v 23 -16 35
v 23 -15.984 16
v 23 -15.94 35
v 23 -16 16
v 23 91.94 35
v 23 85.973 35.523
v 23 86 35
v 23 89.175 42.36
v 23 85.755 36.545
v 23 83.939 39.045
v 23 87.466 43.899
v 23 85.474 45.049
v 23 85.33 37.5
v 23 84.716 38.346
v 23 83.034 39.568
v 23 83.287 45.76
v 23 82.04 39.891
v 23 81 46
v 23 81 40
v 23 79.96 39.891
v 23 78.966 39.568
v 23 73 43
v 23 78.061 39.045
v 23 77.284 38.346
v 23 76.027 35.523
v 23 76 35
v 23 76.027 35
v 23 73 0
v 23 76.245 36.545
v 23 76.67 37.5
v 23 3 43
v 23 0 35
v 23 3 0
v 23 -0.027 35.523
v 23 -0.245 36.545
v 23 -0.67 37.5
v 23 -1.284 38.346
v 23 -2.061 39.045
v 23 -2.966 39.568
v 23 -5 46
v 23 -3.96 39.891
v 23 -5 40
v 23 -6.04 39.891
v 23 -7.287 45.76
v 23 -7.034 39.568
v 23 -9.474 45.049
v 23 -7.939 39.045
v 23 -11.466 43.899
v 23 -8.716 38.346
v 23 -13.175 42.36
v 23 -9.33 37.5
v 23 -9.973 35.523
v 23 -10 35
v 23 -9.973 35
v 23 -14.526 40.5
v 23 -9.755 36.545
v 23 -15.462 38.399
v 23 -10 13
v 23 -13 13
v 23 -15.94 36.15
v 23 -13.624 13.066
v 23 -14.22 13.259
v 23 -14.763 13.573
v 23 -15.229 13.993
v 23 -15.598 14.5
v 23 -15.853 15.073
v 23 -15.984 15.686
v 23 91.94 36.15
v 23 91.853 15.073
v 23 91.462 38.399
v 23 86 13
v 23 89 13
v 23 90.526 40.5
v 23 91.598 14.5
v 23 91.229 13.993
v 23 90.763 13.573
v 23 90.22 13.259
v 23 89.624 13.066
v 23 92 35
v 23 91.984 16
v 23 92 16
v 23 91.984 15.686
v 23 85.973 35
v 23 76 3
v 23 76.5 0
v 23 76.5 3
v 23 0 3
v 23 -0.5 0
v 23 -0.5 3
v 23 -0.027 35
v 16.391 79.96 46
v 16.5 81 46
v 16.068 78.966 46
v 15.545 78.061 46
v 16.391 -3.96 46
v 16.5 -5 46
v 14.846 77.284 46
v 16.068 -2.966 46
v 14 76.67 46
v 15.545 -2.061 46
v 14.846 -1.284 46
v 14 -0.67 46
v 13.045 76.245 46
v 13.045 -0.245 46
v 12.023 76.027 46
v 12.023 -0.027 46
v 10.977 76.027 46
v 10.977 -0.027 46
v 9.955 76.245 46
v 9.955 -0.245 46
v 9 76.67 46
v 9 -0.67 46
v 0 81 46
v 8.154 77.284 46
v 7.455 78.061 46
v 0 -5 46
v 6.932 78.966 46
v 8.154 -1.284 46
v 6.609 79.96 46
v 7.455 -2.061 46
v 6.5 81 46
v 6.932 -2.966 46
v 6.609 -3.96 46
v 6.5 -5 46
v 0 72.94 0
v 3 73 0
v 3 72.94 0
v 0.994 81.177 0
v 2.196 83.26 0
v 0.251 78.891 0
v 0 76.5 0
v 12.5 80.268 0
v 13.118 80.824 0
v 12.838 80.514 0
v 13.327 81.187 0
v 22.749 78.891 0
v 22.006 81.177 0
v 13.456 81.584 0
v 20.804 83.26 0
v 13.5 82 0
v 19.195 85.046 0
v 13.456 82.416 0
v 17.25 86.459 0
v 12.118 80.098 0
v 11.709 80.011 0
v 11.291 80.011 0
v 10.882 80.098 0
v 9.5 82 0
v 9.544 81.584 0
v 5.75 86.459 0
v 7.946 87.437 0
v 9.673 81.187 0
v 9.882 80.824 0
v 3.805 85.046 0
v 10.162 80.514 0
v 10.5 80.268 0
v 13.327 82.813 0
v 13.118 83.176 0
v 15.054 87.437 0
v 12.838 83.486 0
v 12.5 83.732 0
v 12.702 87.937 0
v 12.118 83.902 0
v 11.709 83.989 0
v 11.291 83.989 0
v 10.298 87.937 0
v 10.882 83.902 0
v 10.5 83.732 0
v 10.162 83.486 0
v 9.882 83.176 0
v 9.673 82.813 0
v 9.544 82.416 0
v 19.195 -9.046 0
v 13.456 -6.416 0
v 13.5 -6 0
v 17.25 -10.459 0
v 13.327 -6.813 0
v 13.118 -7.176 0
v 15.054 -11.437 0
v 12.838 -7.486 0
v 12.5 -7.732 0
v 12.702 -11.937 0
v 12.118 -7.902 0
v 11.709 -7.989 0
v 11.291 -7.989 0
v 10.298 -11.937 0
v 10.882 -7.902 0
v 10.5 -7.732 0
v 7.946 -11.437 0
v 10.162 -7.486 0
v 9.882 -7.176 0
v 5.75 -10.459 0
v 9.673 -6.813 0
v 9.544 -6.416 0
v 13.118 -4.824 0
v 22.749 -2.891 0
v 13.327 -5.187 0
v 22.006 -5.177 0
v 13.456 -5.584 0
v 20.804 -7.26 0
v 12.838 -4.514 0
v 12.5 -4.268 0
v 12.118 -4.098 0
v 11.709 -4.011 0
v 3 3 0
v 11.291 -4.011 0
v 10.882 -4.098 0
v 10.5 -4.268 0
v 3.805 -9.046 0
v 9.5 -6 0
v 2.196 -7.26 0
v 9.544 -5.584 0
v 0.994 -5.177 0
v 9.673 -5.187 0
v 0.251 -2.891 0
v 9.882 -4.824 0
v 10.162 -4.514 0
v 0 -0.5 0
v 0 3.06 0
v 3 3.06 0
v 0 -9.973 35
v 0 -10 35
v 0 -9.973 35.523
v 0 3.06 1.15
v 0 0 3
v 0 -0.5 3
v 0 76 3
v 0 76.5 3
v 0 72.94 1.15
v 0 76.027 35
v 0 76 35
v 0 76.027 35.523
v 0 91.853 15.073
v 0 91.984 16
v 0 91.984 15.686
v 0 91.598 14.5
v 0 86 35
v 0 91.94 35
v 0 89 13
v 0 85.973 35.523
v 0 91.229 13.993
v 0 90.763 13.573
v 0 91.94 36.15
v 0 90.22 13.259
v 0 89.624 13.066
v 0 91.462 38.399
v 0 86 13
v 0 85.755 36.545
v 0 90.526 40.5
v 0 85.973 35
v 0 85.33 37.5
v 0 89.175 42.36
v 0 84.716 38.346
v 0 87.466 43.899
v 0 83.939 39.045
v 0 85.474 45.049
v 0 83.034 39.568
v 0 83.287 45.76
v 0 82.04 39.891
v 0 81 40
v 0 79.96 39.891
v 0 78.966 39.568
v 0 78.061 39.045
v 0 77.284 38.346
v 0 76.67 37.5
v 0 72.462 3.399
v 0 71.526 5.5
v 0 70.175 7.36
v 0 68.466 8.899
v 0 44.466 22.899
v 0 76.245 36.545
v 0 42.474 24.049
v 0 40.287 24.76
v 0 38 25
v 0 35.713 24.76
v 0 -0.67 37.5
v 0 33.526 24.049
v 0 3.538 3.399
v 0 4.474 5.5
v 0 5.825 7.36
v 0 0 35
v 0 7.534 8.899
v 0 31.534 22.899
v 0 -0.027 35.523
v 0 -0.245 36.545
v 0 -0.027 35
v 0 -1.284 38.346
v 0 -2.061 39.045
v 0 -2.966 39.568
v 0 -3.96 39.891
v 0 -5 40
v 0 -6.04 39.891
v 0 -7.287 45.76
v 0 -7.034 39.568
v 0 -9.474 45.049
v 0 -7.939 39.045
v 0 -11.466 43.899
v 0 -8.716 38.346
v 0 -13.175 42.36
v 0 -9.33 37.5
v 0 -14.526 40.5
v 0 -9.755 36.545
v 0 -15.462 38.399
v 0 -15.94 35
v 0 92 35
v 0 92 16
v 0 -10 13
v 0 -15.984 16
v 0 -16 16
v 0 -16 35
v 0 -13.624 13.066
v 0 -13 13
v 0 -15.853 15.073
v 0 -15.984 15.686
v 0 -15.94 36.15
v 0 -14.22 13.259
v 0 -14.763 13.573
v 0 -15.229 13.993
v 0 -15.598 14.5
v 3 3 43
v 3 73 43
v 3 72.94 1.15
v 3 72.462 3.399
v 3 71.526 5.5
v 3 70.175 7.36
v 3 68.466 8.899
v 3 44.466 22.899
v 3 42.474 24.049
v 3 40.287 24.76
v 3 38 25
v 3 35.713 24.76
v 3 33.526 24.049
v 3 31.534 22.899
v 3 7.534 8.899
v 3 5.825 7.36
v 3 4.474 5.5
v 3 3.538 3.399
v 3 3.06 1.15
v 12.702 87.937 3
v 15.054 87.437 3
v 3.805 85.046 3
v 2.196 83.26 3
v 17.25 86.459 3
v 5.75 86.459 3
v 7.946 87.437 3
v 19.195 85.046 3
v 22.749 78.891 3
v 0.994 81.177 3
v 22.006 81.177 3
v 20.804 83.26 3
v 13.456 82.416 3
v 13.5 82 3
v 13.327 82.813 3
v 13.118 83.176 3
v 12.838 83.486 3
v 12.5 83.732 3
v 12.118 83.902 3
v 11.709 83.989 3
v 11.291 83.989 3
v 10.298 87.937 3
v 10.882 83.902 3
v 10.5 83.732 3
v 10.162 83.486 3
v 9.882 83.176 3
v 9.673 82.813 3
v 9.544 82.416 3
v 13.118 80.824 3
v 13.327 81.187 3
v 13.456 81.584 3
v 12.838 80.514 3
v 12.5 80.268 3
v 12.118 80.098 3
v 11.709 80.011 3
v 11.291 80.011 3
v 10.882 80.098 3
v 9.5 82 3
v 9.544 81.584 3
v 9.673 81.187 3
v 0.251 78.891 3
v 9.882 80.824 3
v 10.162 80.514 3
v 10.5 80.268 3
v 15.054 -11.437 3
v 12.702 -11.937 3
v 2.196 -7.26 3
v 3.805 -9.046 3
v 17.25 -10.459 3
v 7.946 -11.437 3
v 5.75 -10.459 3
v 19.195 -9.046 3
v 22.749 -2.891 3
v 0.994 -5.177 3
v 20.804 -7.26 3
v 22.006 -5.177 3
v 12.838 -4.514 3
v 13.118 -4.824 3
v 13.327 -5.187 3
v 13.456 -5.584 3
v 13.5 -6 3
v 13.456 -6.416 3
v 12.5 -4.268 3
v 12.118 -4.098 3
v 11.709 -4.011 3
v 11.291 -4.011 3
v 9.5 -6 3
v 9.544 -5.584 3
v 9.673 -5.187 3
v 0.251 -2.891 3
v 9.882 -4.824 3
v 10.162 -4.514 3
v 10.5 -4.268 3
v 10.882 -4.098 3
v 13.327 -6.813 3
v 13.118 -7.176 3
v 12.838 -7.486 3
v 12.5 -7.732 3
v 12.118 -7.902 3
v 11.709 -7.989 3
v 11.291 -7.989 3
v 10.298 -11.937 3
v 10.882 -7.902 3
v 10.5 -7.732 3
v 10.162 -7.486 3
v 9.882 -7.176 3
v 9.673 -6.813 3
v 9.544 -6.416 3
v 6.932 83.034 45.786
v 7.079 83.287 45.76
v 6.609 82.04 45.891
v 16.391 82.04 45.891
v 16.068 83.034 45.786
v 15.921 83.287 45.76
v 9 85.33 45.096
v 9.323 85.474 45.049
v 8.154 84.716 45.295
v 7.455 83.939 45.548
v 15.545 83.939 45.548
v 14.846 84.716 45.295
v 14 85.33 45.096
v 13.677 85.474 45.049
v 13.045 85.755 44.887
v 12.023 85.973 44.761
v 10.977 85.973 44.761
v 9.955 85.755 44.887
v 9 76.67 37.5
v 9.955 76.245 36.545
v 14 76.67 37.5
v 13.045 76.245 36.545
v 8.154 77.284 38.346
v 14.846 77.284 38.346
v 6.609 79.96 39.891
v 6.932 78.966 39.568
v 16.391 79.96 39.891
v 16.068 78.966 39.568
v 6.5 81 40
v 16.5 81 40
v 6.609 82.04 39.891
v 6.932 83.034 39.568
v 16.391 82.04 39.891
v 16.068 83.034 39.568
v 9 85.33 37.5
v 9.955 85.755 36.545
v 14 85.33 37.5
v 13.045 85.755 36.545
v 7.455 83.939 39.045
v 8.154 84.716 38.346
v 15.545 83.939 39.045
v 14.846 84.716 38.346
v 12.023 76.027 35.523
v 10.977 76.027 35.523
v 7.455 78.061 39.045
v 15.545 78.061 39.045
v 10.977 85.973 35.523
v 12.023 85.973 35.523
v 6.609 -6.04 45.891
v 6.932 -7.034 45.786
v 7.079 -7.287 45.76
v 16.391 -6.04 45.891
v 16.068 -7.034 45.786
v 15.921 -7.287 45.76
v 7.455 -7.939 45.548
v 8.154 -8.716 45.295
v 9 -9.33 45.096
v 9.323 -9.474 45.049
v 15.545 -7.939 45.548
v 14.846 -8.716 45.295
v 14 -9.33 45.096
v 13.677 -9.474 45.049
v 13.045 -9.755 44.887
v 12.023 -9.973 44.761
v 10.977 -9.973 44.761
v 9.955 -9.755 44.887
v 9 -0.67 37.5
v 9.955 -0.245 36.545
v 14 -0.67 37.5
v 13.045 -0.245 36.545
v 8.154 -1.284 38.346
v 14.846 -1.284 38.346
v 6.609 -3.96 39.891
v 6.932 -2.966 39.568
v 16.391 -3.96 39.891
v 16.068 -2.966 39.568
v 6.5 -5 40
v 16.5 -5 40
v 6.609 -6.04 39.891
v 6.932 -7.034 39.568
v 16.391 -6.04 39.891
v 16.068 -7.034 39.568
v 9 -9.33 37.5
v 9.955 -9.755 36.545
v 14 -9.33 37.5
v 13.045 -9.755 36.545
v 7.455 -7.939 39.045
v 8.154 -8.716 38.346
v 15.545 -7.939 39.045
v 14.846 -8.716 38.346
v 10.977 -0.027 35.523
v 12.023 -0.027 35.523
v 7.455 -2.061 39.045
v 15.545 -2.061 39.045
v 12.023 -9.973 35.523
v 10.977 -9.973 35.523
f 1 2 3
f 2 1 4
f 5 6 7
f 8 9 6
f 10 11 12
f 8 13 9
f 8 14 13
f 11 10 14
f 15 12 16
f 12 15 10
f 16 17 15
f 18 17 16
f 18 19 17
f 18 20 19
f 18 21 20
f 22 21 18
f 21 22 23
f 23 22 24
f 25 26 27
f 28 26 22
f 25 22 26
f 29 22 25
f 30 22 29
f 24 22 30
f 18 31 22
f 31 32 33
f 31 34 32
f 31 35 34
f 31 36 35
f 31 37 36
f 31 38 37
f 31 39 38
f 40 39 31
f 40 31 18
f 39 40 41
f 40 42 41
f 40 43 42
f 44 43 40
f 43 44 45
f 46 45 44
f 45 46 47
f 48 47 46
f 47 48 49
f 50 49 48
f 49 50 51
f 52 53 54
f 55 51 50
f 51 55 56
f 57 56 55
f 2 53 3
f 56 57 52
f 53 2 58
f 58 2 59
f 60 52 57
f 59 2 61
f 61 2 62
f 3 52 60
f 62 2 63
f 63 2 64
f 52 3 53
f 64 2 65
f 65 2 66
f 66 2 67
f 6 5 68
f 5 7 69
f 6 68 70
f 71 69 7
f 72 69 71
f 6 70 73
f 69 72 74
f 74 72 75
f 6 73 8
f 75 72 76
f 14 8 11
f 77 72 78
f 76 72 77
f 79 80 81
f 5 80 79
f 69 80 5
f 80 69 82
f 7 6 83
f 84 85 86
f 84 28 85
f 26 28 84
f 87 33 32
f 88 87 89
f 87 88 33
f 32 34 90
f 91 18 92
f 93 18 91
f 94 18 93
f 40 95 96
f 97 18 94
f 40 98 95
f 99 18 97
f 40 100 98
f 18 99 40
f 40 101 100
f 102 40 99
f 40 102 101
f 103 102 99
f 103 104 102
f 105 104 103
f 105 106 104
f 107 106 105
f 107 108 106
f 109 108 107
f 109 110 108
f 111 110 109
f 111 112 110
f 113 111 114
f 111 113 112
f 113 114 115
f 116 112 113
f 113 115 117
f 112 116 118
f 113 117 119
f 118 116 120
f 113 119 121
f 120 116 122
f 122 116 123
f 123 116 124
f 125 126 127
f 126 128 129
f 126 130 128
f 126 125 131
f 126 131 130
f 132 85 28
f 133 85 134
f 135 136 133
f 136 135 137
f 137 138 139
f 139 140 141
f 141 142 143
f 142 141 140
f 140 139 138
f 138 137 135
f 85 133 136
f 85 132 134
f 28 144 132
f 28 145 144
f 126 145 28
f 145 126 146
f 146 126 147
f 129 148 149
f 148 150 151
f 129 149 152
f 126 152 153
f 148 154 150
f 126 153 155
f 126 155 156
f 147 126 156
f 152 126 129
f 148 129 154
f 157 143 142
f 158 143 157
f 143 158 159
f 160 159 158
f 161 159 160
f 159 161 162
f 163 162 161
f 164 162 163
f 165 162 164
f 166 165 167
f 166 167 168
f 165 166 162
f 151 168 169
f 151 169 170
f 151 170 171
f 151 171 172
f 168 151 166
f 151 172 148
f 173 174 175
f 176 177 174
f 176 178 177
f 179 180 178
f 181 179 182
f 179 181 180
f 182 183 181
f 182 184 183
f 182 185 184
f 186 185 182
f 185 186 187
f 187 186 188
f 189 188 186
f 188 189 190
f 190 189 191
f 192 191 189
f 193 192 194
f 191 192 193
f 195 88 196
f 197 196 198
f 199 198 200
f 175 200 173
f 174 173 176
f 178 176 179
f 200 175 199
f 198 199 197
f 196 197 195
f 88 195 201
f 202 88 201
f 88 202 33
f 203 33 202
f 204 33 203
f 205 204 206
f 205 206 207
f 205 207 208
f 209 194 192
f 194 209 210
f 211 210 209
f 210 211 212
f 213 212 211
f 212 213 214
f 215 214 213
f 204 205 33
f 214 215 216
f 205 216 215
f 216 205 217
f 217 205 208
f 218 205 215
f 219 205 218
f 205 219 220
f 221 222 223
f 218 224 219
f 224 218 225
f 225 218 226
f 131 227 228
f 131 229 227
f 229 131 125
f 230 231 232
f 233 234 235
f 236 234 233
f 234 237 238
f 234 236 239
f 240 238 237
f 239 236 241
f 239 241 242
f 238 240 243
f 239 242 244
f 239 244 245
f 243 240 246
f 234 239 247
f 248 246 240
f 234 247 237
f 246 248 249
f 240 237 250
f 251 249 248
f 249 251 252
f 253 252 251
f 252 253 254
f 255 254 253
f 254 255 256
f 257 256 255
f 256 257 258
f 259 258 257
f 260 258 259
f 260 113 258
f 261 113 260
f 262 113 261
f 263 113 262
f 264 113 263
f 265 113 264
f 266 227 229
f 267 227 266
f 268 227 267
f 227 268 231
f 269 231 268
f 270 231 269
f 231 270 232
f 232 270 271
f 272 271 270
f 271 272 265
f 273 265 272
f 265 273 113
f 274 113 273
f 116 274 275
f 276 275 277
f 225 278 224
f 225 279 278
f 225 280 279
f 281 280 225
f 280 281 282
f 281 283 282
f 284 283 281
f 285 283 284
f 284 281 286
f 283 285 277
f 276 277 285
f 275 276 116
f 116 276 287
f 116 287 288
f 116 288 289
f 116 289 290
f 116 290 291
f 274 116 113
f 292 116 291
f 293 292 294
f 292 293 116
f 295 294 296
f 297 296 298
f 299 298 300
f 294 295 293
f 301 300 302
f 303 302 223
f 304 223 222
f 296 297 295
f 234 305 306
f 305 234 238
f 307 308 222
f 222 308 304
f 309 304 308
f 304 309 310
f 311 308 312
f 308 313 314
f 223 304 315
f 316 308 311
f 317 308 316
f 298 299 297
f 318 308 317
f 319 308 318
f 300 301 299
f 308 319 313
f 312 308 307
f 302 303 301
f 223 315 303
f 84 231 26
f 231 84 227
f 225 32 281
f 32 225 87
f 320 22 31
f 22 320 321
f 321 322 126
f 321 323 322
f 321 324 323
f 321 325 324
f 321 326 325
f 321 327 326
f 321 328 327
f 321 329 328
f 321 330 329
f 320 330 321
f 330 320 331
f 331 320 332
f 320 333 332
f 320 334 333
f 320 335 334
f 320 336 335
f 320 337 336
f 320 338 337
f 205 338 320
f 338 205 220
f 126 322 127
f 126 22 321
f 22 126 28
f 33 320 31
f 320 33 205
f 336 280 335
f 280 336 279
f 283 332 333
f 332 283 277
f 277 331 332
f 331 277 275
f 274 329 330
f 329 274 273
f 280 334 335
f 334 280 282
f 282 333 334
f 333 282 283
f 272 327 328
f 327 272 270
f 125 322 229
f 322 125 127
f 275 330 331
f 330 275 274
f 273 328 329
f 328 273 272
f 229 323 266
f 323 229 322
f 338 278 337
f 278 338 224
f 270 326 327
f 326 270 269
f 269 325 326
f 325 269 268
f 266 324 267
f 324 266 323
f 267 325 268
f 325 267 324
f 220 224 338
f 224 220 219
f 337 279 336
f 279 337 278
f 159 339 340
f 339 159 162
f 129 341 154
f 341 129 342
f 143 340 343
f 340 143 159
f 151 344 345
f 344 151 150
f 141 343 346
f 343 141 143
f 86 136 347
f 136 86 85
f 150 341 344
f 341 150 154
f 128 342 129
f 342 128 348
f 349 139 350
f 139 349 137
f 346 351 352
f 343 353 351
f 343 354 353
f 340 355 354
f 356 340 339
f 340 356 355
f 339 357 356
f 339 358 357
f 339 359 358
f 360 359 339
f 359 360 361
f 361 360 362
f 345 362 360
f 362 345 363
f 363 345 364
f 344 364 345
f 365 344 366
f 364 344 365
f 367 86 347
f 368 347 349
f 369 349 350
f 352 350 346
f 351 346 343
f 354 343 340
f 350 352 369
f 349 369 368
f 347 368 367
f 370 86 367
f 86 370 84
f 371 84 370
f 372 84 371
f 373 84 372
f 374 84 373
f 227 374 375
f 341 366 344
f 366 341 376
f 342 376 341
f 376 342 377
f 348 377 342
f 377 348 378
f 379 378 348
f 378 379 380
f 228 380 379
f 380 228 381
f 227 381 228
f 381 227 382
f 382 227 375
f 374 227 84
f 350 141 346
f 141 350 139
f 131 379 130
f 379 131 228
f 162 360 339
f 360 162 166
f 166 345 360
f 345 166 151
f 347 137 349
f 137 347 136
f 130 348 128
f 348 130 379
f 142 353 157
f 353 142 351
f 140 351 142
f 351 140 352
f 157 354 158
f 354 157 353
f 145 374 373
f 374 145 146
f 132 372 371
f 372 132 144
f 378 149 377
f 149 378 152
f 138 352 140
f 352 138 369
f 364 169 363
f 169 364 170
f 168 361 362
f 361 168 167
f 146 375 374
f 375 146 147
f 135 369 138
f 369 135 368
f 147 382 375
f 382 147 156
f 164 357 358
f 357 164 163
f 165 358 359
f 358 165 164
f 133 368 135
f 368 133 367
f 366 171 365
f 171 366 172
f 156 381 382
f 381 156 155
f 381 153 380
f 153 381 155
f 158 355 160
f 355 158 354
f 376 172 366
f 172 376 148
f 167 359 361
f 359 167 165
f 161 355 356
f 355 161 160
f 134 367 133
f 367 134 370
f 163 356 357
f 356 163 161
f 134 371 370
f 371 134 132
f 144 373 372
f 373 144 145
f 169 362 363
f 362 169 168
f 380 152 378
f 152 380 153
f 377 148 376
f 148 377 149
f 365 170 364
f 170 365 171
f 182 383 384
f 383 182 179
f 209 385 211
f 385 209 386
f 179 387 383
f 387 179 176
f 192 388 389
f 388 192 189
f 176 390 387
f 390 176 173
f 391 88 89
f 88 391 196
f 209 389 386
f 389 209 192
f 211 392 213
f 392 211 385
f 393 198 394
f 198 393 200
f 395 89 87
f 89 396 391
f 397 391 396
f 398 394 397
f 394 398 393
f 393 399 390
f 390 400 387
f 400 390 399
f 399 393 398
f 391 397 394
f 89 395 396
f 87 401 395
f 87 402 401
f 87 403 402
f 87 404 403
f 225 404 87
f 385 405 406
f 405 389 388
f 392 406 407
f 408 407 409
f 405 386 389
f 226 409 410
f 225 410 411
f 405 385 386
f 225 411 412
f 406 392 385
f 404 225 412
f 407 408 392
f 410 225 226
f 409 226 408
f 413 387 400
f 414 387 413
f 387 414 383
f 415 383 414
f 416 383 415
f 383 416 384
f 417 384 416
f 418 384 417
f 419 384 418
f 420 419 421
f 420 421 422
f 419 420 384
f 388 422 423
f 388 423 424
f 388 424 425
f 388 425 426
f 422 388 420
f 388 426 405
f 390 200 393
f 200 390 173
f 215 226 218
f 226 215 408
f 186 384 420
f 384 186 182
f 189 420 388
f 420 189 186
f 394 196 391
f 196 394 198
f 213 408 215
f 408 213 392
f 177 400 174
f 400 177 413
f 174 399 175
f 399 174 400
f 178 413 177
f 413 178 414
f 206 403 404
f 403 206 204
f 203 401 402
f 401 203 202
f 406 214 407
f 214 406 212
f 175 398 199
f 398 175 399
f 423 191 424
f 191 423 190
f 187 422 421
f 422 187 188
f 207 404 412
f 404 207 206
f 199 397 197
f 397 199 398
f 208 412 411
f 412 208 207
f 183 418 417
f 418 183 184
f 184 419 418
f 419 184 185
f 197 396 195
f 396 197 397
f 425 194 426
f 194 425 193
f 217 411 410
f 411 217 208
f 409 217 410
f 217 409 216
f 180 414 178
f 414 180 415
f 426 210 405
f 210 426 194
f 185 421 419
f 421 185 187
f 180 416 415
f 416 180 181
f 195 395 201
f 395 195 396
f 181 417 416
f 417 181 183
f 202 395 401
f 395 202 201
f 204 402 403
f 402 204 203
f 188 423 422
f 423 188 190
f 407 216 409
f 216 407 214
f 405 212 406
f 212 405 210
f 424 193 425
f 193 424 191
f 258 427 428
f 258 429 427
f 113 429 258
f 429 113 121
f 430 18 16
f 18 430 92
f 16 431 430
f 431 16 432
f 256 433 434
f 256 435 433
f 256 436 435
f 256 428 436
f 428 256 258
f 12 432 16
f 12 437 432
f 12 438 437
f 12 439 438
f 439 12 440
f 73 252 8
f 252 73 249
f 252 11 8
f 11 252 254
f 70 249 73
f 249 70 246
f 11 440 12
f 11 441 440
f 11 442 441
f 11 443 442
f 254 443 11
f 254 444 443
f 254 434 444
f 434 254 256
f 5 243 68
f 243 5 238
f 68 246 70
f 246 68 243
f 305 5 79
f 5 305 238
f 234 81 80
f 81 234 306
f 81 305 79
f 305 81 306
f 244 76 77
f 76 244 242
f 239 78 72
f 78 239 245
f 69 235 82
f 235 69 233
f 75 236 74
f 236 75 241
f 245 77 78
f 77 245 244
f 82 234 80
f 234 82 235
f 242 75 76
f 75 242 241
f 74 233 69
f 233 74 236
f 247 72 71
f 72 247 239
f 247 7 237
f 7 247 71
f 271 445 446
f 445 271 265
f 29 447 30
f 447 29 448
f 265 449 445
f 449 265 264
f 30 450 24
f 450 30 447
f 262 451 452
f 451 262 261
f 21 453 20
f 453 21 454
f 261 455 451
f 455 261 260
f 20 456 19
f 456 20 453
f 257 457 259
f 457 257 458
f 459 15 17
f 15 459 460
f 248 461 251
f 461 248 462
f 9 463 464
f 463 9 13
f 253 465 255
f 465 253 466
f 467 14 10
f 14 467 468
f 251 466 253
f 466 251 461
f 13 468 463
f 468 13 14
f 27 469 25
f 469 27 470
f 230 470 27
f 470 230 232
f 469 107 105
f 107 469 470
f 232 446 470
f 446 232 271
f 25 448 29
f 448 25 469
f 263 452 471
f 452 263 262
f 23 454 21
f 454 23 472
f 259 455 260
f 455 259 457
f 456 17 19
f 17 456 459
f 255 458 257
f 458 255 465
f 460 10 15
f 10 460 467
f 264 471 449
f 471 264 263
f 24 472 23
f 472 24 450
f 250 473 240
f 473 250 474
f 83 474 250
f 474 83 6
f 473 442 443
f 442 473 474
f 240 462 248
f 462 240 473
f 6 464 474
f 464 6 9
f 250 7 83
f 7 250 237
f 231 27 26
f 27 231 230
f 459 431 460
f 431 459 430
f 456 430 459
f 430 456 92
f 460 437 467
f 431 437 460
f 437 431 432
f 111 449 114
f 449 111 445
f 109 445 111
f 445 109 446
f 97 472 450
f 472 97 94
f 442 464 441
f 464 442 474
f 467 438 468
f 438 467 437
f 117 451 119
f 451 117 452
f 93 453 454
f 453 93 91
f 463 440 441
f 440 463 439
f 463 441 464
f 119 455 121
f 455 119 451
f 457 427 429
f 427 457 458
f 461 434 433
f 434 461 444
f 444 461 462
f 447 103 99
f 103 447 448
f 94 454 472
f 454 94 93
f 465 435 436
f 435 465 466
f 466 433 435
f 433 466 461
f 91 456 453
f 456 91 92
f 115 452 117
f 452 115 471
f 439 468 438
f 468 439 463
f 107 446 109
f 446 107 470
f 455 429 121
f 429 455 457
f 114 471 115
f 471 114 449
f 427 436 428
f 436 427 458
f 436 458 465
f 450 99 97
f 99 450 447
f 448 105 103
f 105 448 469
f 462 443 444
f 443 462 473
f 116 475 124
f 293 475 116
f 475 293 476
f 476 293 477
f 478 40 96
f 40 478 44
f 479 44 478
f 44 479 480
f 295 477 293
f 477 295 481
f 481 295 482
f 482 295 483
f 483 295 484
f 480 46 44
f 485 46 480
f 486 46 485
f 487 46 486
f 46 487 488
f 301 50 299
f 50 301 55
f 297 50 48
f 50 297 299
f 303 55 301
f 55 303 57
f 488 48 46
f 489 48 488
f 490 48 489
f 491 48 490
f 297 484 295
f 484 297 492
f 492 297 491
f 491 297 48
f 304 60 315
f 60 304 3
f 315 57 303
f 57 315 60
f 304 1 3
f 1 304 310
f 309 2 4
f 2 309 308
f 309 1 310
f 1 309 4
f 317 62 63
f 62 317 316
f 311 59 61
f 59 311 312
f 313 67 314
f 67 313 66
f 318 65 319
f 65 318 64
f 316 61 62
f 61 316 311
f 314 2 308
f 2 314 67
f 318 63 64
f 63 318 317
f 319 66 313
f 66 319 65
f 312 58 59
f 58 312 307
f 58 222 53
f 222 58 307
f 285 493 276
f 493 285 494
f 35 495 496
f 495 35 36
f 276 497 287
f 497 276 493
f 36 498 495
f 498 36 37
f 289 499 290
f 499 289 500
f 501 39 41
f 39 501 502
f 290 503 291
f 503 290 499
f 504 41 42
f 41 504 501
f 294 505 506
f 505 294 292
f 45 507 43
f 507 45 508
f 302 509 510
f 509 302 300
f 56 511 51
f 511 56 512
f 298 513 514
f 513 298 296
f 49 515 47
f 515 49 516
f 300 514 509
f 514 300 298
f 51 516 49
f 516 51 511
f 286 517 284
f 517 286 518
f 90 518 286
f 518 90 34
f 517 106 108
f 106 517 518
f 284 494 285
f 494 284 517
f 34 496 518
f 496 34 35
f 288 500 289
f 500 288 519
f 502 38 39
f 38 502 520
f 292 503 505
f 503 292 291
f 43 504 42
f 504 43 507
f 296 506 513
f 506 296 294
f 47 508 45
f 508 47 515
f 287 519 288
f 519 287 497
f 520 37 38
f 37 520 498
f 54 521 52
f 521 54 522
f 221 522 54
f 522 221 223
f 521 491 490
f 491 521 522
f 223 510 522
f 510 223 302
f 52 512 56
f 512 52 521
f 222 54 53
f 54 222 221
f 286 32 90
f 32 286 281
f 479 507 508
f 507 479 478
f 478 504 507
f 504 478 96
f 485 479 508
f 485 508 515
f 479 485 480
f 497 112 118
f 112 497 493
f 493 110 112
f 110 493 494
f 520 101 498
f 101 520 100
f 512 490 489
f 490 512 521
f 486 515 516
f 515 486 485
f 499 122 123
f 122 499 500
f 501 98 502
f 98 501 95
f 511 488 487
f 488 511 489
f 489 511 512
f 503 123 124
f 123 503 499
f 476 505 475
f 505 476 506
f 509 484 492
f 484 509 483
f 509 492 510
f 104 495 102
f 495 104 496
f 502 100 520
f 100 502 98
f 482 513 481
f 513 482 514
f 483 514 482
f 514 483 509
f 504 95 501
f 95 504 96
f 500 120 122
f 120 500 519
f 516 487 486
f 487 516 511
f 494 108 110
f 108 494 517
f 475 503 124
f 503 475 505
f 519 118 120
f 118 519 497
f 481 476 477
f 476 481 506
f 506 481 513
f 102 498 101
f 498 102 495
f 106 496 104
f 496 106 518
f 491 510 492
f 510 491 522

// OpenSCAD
/* [Hidden] */
$fs=0.1;

/* [Global] */
// The width of your socket
socket_width=70; 

// The height of your socket
socket_height=43;

// How far should your socket be covered in total?
overlay=20;


/* [Cable holder] */
// Cableholder on the left ?
cable_holder_right = true;

// Cable holder on th eright?
cable_holder_left = true;

// Thickness of the Cable holder
cable_holder_thickness = 6;

// Distance to cable holder
cable_holder_width = 10;


/* [Plug cuts] */
// Offset from the end of the socket to the beginning of the round cut
outlet_cut_round_offset=0; 

// Diameter of the round cut (0=disabled) (Schuko=41)
outlet_cut_diameter=0; 


// Offset from the end of the socket to the beginning of the rectangular cut
switch_cut_rect_offset=0; 

// Diameter of the rectangular cut (0=disabled)
switch_cut_rect_width=0; 


/* [Cable outlet cuts] */

// Distance from the bottom of the socket to the top of the cable
cable_top_offset=25;

// Diameter of the cable cut
cable_diameter=22; 


/* [Other] */
// Wall thickness
thickness=3; 

// Diameter of the screw holde
screw_diameter = 4; 


outerwidth=socket_width+2*thickness;
outerheight=socket_height+thickness;
outerdepth=overlay+thickness;

cableholderheight = outerheight-cable_holder_width-thickness;



render () {
difference () {
    cube([outerdepth,outerwidth,outerheight]);
    translate([thickness,thickness,0])
        cube([overlay,socket_width,socket_height]);

    // cable outlet
    hull()
    {
        translate ([0,outerwidth/2,cable_top_offset-cable_diameter/2])
            rotate ([0,90,0])
                cylinder (h=thickness*2,r=cable_diameter/2,center=false);

        translate ([0,thickness+cable_diameter/2,0])
            rotate ([0,90,0])
                cylinder (h=thickness*2,r=cable_diameter/2,center=false);

        translate ([0,outerwidth-(thickness+cable_diameter/2),0])
            rotate ([0,90,0])
                cylinder (h=thickness*2,r=cable_diameter/2);
    
    }
    
    // socketcut round
    translate ([outlet_cut_round_offset+thickness+outlet_cut_diameter/2,outerwidth/2,outerheight-thickness])
        cylinder (h=thickness*2,r=outlet_cut_diameter/2);
    
    
    // socketcut rectangular
    translate ([switch_cut_rect_offset+thickness,(outerwidth-switch_cut_rect_width)/2,outerheight-thickness])
        cube ([overlay,switch_cut_rect_width,thickness*2]);
}


//srewfix right
translate([0,outerwidth],0)
    screwfix(outerdepth,thickness,screw_diameter);

//screwfix left
mirror([0,1,0])
    screwfix(outerdepth,thickness,screw_diameter);


//cableholder right
if (cable_holder_right)
{
translate([0,outerwidth,outerheight])
    cableholder(cable_holder_width,cable_holder_thickness,
    cableholderheight,
    outerdepth,
    screw_diameter*2.5);    // change this factor to adjust the screw driver width
}

//cableholder left
if (cable_holder_left)
{
    translate([0,0,outerheight])
        mirror([0,1,0])
        cableholder(cable_holder_width,cable_holder_thickness,
        cableholderheight,
        outerdepth,
        screw_diameter*2.5);    // change this factor to adjust the screw driver width
}
}


module cableholder (
    width,
    cthickness,
    height,
    depth,
    dia)
{
    outerradius = width/2+cthickness; 

    // Point zero at top left corner
    difference(){
        union() {
            // top cylinder
            translate ([0,width/2,(width/2+cthickness)*-1])
                rotate ([0,90,0])
                    cylinder (h=depth,r=outerradius);
           
            // fill corner on cylinder
            translate ([0,0,(width/2+cthickness)*-1])
                cube ([depth,width/2,outerradius]);
            
            // main bar
            translate ([0,0,cthickness/2-height])
                cube ([depth,width+cthickness,height-outerradius-cthickness/2]);
            
            // main bar lower rounding
            translate ([0,width+cthickness/2,cthickness/2-height])
                rotate ([0,90,0])
                    cylinder (h=depth,r=cthickness/2);
            
            // corner out main bar rounding
            translate([0,width,height*-1])
                cube([depth,cthickness/2,cthickness/2]);
        }

        //top inner rounding
        translate ([0,width/2,(width/2+cthickness)*-1])
            rotate ([0,90,0])
                cylinder (h=depth*2,r=width/2);
        // main inner space
        translate ([0,0,(height+width)*-1])
            cube ([depth,width,height+width/2-cthickness]);
        
        // screwslot
        translate ([(depth)/2, max(width/2,dia/2),height*-1])
                cylinder (h=height,r=dia/2);   
        
        // remove overhanging cylinder  
        translate([0,outerradius*-1,outerradius*-2])
            cube ([depth,outerradius,outerradius*2]); 
    }
}
    


module screwfix(width,height,diameter) {
    length=3*diameter;
    radius=min(length,width/2);
    difference(){
        hull() {
            cube([width,length-radius,height]);
            
            translate ([width-radius,length-radius,0]) 
                cylinder (h=height,r=radius);
            translate ([radius,length-radius,0]) 
                cylinder (h=height,r=radius);
       };
       // screwholes
       translate ([(width)/2,length/2,0]) 
            cylinder(h=height,r=diameter/2);
       
       // remove leftover from rounding
       translate ([0,radius*-1,0])
            cube([width,radius,height]);
    }
}
